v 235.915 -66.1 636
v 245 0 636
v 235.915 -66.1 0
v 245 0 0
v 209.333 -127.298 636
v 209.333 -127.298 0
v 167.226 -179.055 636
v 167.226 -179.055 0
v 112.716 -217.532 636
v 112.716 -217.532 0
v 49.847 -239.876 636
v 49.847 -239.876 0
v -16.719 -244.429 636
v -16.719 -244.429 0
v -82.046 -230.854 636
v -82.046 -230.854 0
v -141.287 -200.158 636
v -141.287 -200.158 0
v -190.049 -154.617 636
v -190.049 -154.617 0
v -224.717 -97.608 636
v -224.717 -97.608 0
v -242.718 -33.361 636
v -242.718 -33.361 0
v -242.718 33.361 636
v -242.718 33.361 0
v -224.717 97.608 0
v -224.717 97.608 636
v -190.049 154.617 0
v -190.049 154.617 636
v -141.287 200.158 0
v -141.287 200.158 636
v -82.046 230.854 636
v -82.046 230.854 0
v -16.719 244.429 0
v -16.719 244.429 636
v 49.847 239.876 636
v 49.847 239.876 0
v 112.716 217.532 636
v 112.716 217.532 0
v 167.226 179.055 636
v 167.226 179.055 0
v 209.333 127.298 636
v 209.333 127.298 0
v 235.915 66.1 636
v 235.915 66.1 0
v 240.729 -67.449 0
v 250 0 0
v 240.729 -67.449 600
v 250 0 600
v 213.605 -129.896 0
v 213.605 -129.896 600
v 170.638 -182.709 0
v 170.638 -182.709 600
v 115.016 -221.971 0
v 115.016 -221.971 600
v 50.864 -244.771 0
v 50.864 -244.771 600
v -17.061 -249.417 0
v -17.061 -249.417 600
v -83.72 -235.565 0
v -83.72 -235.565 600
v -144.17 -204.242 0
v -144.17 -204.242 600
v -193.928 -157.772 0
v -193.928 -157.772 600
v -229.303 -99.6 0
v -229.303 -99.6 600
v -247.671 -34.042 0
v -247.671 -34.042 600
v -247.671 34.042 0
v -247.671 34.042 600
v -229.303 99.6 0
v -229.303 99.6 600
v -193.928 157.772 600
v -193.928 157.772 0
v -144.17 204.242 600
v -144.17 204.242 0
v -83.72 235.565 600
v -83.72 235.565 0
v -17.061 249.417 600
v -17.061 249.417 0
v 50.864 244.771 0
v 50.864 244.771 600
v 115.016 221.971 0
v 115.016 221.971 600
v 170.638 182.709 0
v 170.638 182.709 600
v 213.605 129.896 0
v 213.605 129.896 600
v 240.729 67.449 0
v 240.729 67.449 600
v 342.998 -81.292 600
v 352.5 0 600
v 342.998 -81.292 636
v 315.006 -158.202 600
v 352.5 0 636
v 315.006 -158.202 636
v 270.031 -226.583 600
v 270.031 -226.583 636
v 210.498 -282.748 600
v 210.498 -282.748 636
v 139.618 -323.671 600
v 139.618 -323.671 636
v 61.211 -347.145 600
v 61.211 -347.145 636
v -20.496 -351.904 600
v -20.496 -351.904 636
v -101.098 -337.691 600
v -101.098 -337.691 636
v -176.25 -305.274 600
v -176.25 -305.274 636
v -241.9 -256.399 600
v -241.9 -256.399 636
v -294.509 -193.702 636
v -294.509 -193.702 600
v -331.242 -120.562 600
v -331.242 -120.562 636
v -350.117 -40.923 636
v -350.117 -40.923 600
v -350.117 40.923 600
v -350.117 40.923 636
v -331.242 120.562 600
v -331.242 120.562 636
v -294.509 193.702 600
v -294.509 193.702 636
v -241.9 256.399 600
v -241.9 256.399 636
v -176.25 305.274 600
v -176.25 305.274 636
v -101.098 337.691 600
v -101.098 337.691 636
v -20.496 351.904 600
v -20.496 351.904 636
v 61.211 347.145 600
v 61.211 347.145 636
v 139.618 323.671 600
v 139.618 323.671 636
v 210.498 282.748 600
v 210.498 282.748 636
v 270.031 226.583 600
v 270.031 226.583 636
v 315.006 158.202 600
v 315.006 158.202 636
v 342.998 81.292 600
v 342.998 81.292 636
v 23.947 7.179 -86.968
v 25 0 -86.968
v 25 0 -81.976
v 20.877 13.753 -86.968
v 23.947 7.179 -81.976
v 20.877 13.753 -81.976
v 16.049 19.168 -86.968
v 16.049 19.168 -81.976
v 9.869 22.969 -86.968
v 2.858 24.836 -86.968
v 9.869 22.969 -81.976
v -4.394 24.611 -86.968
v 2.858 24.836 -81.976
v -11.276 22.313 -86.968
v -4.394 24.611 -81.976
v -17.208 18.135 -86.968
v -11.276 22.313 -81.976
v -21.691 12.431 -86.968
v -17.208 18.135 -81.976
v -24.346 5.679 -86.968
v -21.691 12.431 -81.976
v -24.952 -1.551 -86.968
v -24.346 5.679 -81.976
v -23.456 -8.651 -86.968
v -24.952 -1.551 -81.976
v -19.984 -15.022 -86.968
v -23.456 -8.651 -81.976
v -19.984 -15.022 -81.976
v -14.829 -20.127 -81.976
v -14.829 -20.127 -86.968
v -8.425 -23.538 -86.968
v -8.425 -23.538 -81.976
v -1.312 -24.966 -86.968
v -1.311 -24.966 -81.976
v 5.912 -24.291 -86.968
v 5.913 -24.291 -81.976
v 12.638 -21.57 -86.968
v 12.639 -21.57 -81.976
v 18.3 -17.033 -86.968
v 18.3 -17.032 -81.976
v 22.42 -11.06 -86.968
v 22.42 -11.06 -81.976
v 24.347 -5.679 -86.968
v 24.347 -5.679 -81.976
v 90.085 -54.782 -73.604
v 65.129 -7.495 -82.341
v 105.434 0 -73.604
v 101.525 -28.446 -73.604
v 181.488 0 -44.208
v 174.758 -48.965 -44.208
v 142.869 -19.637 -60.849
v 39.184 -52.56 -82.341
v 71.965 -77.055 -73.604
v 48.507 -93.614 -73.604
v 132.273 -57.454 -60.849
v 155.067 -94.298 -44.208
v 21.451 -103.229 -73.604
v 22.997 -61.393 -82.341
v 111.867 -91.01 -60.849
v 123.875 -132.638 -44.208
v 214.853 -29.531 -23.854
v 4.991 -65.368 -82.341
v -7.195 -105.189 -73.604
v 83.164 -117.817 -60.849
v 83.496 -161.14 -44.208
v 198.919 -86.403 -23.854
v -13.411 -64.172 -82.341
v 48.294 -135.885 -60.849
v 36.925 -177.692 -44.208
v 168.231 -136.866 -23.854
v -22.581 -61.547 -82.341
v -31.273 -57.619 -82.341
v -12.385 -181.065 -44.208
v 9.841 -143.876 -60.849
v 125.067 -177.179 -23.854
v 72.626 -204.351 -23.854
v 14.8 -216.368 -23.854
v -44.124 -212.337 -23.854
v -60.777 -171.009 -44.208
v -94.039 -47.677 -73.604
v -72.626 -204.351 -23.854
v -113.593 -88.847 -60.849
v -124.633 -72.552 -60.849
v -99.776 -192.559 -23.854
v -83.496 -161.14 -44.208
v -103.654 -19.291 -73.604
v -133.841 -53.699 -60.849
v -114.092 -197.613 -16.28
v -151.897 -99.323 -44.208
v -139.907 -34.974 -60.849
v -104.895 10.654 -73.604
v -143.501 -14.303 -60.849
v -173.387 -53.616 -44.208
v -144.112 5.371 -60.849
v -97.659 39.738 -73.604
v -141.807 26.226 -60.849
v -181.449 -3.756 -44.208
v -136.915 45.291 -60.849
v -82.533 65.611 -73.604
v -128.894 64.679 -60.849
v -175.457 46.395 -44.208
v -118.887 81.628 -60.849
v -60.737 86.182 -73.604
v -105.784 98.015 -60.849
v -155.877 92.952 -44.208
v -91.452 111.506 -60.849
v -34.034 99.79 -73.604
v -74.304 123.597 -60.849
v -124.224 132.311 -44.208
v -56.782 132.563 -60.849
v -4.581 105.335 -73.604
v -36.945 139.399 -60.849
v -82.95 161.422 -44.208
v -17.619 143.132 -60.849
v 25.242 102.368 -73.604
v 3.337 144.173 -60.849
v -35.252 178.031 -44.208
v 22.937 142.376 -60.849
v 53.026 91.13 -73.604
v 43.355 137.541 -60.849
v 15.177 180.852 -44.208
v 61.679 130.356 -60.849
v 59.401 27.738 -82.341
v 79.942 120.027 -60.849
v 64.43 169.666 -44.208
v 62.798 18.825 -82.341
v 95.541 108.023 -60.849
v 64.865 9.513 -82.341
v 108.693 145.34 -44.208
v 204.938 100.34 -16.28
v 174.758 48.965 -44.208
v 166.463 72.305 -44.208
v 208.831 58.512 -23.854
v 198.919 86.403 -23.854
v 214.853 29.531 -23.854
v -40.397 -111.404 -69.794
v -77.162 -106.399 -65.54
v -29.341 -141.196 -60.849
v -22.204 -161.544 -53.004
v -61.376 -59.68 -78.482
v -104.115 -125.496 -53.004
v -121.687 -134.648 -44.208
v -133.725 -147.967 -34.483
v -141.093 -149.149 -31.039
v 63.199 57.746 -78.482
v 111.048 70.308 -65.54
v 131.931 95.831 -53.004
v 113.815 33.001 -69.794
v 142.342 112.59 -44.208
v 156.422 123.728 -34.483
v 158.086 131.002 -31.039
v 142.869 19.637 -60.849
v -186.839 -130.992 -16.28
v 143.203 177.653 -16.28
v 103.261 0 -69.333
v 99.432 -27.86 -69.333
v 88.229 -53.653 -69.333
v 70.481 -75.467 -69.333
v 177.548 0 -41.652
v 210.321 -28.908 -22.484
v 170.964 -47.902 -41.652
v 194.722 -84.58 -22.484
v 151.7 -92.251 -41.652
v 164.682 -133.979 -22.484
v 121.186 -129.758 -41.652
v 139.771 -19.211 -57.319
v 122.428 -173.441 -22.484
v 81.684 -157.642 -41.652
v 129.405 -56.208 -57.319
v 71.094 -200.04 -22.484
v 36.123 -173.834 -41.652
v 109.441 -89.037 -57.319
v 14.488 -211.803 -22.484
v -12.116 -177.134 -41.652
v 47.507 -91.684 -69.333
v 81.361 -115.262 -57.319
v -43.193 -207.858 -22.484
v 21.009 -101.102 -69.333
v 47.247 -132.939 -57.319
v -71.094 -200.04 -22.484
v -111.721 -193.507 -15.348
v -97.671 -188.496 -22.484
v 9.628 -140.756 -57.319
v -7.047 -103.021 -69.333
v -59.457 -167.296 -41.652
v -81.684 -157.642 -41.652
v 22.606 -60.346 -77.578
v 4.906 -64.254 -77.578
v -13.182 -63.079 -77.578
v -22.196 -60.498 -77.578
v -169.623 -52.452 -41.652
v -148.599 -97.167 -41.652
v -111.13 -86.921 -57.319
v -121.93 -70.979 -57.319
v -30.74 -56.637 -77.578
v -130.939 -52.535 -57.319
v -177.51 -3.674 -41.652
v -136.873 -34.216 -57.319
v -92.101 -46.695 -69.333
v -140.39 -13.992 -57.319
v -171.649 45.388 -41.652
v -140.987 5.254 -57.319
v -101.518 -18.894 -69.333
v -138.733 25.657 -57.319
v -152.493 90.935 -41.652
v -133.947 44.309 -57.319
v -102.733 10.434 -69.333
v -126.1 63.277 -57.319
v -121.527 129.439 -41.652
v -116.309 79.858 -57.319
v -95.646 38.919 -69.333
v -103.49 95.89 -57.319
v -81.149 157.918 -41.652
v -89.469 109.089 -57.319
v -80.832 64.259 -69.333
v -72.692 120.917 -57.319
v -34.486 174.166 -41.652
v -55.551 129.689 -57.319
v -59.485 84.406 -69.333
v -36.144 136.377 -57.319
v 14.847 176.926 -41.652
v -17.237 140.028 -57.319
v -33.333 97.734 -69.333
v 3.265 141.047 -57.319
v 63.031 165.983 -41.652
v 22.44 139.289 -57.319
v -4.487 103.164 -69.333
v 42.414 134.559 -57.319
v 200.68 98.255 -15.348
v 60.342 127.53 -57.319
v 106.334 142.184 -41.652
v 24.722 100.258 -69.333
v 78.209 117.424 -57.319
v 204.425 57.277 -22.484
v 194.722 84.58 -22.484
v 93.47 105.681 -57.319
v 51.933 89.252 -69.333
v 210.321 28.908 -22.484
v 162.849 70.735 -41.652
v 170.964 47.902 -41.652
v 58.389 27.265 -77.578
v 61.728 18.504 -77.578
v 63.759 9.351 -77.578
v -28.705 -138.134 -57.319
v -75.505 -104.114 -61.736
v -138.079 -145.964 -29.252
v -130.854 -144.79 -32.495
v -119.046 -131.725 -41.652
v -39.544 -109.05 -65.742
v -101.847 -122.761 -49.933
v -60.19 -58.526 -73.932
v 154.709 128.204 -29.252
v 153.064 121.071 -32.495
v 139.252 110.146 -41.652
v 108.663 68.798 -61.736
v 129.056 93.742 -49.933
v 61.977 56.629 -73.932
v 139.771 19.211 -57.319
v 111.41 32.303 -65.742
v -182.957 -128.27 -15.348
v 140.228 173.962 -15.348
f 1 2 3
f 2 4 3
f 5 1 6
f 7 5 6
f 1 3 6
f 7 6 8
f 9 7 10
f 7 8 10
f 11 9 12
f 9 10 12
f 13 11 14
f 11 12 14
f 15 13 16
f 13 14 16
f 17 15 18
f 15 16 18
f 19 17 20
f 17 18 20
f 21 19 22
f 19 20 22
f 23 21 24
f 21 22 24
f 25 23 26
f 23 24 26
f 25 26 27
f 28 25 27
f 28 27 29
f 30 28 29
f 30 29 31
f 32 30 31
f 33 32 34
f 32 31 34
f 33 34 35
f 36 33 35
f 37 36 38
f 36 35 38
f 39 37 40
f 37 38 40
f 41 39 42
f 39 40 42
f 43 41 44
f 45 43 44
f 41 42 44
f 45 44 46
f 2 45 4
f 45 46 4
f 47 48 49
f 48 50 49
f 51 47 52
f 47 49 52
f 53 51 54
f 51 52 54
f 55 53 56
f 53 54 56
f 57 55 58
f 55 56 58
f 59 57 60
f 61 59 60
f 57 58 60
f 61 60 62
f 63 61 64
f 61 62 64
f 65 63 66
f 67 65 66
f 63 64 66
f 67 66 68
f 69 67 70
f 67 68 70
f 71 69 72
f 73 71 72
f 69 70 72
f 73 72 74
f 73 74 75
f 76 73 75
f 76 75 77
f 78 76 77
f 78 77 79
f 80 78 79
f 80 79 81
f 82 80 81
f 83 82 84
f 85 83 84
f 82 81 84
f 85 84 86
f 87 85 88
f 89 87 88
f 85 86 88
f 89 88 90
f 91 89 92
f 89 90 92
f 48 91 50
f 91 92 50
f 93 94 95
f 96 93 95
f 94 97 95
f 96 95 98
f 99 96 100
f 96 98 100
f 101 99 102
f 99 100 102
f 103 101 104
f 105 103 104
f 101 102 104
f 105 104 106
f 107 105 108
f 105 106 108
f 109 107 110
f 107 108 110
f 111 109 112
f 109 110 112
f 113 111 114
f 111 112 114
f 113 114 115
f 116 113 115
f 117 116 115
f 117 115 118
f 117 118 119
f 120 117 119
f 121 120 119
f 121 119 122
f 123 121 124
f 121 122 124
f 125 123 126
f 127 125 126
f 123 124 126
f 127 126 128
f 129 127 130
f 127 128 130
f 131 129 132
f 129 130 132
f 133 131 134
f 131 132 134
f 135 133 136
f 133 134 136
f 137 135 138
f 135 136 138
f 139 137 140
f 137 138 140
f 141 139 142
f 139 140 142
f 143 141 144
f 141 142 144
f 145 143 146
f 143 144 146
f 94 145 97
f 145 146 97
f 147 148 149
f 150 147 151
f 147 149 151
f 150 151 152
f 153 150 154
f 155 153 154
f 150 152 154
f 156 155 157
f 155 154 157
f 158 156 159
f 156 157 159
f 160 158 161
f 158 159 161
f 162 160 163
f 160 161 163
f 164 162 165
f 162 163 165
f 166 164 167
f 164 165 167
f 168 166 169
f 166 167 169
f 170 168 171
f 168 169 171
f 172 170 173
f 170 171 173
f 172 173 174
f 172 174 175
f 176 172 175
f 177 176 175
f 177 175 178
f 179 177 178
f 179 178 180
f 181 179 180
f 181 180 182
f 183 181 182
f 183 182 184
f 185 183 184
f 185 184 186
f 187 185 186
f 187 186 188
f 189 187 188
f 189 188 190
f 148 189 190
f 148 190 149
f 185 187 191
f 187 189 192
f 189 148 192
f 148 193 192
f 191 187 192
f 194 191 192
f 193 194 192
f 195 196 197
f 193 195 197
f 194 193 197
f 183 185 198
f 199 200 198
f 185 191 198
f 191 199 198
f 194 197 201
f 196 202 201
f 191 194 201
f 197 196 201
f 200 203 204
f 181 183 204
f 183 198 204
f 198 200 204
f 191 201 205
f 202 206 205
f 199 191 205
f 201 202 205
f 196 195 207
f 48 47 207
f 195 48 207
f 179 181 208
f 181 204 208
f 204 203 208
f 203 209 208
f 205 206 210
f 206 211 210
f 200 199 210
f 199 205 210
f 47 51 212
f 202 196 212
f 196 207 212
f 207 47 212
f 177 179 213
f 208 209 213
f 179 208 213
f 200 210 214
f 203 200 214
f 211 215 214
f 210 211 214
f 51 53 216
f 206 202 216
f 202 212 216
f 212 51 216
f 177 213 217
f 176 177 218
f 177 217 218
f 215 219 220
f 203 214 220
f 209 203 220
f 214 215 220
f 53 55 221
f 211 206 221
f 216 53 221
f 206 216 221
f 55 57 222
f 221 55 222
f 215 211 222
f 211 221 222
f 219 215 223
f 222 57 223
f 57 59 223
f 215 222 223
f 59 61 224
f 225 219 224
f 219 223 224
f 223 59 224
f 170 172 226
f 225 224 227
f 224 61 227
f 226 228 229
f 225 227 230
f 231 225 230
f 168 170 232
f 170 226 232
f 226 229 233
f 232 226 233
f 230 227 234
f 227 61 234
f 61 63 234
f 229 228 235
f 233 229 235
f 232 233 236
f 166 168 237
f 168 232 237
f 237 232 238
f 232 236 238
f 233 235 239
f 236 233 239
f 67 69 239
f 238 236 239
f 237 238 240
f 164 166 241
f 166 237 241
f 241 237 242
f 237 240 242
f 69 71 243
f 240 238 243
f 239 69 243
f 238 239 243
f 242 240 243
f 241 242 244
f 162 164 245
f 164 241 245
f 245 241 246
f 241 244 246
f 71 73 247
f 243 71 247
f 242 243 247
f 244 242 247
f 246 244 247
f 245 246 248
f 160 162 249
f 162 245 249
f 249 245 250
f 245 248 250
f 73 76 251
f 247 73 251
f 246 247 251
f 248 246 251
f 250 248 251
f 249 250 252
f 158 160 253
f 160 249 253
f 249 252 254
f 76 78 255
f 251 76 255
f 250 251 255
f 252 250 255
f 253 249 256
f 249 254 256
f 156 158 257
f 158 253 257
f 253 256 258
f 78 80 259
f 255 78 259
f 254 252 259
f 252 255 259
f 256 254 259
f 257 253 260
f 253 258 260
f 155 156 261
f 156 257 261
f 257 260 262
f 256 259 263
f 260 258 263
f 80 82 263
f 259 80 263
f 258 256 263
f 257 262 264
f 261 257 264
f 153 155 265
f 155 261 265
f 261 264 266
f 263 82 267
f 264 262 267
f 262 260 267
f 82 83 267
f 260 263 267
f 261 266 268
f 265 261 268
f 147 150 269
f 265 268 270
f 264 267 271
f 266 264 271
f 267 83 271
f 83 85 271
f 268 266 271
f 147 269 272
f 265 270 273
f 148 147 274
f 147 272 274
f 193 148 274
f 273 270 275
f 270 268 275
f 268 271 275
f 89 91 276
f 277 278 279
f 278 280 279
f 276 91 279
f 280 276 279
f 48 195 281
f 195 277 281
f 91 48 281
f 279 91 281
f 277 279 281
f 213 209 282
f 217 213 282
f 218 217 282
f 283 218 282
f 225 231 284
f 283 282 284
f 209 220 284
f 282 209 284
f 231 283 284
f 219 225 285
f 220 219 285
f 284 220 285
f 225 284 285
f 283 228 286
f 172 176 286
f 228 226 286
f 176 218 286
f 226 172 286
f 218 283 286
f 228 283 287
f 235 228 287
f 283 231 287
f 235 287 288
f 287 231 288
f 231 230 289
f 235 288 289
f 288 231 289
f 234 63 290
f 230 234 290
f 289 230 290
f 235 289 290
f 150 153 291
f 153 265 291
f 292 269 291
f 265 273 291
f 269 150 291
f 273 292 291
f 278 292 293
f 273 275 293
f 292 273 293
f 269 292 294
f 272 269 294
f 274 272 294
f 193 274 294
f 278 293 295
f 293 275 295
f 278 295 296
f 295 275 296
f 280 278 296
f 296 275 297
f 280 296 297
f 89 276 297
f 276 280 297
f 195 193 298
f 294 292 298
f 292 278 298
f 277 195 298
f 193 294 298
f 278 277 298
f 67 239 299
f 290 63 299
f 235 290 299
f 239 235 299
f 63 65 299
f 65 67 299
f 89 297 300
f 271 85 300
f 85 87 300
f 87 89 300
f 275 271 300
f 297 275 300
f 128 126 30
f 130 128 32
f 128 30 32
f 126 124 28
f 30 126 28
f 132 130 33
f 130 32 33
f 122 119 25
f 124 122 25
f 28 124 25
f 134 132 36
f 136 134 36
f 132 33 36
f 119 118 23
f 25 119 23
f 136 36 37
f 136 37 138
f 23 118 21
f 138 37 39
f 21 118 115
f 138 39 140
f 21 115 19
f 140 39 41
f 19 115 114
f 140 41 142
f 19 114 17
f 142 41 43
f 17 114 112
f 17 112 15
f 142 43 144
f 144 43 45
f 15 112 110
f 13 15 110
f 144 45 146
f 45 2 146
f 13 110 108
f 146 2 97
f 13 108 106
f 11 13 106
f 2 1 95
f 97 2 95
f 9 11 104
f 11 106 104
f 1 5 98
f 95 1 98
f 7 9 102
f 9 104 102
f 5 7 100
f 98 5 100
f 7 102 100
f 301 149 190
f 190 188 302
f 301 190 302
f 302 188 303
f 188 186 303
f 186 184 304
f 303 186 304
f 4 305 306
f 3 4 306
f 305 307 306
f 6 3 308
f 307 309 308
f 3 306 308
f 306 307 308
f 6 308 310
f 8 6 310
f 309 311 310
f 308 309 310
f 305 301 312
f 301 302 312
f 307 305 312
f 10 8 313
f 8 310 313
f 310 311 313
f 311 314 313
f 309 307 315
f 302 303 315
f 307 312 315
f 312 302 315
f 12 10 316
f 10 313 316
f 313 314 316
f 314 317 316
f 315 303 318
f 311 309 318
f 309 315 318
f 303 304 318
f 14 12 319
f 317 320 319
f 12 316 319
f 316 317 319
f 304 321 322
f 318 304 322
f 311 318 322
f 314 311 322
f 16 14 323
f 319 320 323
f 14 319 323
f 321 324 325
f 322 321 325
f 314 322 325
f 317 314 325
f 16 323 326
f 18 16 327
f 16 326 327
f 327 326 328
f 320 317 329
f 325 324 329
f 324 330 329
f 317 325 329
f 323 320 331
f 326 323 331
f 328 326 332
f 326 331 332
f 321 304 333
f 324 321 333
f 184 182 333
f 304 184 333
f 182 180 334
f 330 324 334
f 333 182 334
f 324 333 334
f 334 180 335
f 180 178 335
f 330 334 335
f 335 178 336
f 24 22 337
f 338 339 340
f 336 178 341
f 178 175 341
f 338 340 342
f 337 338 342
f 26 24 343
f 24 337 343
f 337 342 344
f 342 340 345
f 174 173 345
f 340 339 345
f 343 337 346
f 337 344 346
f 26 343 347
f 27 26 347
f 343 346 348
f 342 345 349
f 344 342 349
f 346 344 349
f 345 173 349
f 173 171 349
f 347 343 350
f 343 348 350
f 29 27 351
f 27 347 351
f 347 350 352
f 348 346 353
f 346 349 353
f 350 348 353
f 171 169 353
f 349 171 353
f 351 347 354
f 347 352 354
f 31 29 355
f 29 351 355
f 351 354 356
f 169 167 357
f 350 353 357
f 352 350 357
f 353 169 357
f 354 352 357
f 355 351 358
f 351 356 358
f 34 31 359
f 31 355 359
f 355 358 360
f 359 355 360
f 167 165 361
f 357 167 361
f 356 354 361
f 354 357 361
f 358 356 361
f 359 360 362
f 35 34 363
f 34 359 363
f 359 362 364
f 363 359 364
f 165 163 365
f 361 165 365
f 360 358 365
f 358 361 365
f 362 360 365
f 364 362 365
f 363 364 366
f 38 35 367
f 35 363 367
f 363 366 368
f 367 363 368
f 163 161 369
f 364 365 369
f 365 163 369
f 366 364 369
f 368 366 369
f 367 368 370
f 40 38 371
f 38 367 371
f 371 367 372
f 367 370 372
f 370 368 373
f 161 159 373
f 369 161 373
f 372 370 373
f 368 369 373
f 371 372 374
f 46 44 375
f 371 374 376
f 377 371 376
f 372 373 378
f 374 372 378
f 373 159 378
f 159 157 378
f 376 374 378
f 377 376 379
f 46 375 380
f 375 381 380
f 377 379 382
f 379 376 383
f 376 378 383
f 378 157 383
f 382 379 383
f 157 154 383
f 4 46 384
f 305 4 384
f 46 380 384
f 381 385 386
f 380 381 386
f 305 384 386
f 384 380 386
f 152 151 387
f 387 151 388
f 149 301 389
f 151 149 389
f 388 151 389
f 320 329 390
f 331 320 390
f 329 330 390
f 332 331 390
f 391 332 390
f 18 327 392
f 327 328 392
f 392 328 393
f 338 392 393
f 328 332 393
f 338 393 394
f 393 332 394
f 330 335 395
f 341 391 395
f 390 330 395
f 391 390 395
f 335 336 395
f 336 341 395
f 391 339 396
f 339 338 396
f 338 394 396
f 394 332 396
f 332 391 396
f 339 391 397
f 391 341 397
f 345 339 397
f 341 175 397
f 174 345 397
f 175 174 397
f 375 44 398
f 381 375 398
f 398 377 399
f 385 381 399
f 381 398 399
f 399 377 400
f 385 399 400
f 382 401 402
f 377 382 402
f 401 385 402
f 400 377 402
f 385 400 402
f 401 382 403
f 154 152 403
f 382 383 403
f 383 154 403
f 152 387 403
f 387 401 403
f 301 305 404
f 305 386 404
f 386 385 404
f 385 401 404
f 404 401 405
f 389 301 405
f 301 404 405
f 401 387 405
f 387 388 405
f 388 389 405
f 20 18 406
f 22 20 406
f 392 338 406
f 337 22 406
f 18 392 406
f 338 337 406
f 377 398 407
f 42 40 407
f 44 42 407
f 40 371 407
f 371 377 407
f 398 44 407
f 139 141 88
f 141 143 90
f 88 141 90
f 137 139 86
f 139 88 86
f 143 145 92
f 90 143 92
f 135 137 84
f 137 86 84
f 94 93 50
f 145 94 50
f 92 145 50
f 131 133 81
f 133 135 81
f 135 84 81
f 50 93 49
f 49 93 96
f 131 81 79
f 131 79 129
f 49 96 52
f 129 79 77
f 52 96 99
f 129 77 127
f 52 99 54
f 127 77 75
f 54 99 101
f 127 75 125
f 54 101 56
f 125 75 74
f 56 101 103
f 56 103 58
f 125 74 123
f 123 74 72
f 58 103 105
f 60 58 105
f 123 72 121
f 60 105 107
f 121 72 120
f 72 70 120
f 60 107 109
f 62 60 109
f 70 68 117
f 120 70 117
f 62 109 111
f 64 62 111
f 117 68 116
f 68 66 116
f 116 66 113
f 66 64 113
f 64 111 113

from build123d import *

# Parameters (mm, degrees)
F2_R     = 25
F3_DEPTH = 87.7511


with BuildPart() as f1:
    # F0 (on Front) → F1 (revolve)
    with BuildSketch(Plane.XZ):
        with BuildLine():
            ThreePointArc((245, 0), (129.298665, -61.504004), (0, -82.7501))
            Line((0, -82.7501), (0, -87.7501))
            ThreePointArc((0, -87.7501), (132.476489, -65.175563), (250, 0))
            Line((250, 0), (250, 600))
            Line((250, 600), (352.5, 600))
            Line((352.5, 600), (352.5, 636))
            Line((352.5, 636), (245, 636))
            Line((245, 636), (245, 0))
        make_face()
    revolve(axis=Axis((0, 0, 24.765719), (0, 0, -1)))

    # F2 (on Top) → F3 (cut, through all)
    with BuildSketch(Plane.XY):
        Circle(F2_R)
    extrude(amount=-F3_DEPTH, mode=Mode.SUBTRACT)


solid = f1.part
